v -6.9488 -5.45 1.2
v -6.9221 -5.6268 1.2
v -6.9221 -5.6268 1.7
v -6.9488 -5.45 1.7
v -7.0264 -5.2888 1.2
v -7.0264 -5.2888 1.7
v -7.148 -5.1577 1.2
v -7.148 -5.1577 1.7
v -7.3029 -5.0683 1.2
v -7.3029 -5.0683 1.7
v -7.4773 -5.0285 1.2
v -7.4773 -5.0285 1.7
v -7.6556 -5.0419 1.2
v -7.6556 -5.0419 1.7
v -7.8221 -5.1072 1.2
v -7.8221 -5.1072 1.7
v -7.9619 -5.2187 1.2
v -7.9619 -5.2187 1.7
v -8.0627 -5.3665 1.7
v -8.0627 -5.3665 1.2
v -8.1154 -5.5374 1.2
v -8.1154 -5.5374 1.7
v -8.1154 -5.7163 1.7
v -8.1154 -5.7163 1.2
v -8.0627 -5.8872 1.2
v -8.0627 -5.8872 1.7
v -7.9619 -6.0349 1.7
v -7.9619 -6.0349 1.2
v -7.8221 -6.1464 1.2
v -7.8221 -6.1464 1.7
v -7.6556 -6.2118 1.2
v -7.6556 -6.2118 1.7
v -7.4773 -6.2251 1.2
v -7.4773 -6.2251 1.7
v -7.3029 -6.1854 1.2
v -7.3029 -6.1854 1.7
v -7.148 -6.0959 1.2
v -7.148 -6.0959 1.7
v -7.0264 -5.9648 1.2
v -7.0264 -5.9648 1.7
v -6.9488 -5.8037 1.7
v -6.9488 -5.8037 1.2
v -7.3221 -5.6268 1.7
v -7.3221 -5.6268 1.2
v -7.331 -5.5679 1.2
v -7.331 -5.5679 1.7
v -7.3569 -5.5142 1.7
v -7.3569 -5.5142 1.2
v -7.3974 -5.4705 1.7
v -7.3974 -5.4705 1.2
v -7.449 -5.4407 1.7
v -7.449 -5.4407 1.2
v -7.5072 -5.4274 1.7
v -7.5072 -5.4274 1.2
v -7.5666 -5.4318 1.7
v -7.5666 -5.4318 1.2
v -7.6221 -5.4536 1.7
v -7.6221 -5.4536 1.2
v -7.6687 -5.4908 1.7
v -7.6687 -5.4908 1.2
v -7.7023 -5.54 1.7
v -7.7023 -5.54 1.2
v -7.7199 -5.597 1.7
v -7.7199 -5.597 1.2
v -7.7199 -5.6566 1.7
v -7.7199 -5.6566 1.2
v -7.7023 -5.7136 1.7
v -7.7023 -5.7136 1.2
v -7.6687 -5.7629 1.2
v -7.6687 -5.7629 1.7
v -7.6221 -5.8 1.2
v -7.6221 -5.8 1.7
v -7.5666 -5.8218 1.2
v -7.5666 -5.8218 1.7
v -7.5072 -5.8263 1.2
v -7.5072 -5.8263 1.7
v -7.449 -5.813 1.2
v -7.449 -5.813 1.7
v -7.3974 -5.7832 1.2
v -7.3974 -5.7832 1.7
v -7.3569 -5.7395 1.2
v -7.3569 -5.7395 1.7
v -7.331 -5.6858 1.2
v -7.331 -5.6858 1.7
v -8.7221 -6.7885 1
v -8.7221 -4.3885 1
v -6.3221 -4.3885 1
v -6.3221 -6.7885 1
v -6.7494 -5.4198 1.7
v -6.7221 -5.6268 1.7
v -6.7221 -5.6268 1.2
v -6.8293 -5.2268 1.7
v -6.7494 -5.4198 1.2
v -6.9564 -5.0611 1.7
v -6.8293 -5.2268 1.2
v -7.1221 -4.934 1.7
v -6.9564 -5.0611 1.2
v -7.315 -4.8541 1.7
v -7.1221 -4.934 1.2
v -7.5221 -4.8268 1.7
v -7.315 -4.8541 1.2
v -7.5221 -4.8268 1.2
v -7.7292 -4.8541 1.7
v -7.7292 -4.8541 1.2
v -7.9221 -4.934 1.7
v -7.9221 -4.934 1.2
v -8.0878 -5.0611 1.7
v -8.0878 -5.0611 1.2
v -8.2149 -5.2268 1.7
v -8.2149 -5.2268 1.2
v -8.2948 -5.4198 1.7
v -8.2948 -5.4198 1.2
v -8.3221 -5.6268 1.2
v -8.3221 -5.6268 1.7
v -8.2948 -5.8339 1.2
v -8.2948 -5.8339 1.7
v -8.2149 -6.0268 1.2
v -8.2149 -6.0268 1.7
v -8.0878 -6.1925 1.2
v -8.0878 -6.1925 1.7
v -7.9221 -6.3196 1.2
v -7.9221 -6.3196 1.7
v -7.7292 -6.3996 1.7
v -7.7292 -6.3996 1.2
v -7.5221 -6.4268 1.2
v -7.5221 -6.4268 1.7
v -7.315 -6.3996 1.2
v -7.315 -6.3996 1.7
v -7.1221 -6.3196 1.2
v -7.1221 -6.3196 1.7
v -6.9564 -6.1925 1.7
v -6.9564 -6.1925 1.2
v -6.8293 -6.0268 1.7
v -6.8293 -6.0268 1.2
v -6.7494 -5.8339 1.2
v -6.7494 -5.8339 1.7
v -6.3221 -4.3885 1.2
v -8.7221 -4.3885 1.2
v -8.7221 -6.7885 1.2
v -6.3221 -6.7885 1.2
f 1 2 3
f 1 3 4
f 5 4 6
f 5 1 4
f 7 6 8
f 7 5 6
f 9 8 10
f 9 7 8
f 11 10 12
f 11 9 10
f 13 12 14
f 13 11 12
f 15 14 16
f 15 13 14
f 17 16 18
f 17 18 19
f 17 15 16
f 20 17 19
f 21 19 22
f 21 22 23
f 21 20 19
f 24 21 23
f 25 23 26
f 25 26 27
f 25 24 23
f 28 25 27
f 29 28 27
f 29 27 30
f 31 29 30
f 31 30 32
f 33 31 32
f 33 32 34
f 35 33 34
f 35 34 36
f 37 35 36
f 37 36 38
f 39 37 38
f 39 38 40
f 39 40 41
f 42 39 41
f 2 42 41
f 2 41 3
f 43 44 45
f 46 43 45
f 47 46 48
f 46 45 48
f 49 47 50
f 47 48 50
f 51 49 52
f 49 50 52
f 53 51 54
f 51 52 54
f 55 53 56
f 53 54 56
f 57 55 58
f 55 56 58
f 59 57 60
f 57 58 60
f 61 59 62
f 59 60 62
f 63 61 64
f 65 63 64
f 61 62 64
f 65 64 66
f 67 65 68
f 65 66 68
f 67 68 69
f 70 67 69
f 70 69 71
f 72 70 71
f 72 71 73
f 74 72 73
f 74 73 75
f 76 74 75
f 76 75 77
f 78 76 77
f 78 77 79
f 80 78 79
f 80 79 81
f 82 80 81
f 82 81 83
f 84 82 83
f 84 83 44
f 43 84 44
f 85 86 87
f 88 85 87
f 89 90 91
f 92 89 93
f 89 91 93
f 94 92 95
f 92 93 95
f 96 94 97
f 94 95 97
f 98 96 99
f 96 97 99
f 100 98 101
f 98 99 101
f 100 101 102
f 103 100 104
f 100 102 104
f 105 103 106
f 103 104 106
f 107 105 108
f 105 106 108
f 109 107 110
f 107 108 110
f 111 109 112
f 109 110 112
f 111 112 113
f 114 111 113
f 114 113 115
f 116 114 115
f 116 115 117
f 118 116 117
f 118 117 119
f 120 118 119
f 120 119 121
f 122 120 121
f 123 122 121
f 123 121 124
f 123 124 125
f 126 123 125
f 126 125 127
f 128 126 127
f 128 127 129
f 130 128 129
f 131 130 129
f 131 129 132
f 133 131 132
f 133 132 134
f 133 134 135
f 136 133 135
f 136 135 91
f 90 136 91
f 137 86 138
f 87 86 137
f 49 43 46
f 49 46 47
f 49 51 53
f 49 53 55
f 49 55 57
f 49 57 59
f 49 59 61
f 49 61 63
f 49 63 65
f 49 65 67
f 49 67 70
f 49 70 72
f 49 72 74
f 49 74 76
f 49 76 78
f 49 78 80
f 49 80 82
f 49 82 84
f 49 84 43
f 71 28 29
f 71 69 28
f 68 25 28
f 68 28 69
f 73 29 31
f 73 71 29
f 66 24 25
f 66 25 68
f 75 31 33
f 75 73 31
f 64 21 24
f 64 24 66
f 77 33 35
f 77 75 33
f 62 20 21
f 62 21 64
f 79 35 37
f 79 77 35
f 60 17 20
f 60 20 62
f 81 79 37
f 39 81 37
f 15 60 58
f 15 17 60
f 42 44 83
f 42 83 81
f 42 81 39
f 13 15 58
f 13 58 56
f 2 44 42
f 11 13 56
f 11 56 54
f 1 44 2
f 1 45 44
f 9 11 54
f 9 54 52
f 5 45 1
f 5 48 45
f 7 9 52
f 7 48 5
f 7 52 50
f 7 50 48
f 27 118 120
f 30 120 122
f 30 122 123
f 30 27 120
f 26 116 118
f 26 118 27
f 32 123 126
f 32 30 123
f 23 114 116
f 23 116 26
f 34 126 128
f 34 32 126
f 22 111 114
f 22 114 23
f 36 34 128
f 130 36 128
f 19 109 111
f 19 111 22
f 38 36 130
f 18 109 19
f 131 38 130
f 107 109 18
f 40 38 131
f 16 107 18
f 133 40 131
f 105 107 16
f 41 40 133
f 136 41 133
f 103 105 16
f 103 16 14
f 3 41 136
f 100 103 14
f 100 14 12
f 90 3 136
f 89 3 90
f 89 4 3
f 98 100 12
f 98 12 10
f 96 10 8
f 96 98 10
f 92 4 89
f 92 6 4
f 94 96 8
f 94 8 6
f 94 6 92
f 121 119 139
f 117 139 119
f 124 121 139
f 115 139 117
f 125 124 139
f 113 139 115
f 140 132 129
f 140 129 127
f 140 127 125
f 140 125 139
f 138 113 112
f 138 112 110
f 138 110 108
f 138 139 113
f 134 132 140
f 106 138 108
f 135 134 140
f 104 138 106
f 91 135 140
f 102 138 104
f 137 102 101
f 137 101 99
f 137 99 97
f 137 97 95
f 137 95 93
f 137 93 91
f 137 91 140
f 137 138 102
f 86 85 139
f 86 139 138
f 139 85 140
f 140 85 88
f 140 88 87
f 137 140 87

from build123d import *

# Parameters (mm, degrees)
SKETCH007_R   = 0.8
SKETCH007_R_2 = 0.6
PAD005_DEPTH  = 0.7
SKETCH008_R   = 0.2
PAD006_DEPTH  = 0.7
SKETCH009_W   = 2.4
SKETCH009_H   = 2.4
PAD007_DEPTH  = 0.2


with BuildPart() as pad005:
    # Sketch007 → Pad005 (new body)
    with BuildSketch(Plane.XY):
        with Locations((-19.6, -6.4)):
            Circle(SKETCH007_R)
        with Locations((-19.6, -6.4)):
            Circle(SKETCH007_R_2, mode=Mode.SUBTRACT)
    extrude(amount=PAD005_DEPTH)


with BuildPart() as pad006:
    # Sketch008 → Pad006 (new body)
    with BuildSketch(Plane.XY):
        with Locations((-19.6, -6.4)):
            Circle(SKETCH008_R)
    extrude(amount=PAD006_DEPTH)


with BuildPart() as fusion003:
    # Sketch009 → Pad007 (new body)
    with BuildSketch(Plane.XY):
        with Locations((-19.6, -6.361635)):
            Rectangle(SKETCH009_W, SKETCH009_H)
    extrude(amount=PAD007_DEPTH)

    # Fusion003: union Pad005, Pad006
    add(pad005.part)
    add(pad006.part)


with BuildPart() as fusion003_1:
    # Fusion003 placement: moved
    add(fusion003.part.moved(Location((12.0779, 0.773174, 1))))


solid = fusion003_1.part
